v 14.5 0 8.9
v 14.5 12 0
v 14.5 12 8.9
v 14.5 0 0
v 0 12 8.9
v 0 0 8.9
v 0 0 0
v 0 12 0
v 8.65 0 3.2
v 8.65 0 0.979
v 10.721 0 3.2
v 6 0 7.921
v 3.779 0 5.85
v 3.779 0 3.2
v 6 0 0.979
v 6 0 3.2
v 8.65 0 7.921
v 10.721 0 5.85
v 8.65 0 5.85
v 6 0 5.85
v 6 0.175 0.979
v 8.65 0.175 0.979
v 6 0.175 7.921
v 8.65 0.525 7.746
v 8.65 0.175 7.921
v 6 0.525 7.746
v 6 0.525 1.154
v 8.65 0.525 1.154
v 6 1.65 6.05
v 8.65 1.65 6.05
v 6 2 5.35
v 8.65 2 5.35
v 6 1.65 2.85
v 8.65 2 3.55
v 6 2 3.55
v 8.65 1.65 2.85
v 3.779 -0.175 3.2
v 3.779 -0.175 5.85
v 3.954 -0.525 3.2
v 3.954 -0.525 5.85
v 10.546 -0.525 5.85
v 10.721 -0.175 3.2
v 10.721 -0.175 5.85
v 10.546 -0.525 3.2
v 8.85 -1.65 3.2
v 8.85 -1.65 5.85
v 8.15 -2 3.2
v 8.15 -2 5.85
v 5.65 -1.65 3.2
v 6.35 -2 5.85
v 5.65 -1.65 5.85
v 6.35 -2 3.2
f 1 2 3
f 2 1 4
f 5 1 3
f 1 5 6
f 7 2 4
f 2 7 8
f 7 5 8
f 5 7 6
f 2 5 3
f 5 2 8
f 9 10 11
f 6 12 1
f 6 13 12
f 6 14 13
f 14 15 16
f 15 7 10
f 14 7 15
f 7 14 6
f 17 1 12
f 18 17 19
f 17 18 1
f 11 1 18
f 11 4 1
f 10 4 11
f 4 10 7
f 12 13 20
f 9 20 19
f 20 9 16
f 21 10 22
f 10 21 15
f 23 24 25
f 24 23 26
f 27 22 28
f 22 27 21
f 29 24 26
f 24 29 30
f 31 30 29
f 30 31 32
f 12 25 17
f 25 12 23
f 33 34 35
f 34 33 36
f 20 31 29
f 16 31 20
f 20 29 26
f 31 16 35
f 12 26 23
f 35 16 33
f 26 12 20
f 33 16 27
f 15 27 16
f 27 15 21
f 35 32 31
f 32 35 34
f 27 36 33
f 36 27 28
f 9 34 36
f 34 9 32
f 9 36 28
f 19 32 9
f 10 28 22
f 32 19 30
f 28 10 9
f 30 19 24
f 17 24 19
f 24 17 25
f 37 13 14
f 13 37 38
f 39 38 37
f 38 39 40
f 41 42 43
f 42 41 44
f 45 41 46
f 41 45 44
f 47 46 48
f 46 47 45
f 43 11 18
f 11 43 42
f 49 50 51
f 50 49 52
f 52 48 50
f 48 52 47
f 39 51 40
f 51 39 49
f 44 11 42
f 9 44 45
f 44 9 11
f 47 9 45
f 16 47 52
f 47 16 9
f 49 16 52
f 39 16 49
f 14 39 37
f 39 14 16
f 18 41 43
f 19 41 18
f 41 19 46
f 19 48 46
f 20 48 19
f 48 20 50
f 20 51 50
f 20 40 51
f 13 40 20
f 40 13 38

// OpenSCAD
// file: Parts/ZipTiePoint.scad
module ziptiepoint(width = 2.5, depth = 2, cutout_sample = false) {
    module cutout(width, depth) {
        chamfer = 0.35;
        io_height = (depth) / tan(42);
        middle_height = depth * 1.25;

        // cutout for ziptie
        translate([0, - (2 * io_height + middle_height) / 2, - width / 2])
            linear_extrude(height = width + 0.15) {
                polygon([
                        [0, 0],
                        [chamfer-chamfer/2, 0],
                        [chamfer+chamfer/2, chamfer/2],
                        [depth - chamfer, io_height - chamfer],
                        [depth, io_height + chamfer],
                        [depth, io_height + middle_height - chamfer],
                        [depth - chamfer, io_height + middle_height + chamfer],
                        [chamfer+chamfer/2, 2 * io_height + middle_height - chamfer/2],
                        [chamfer-chamfer/2, 2 * io_height + middle_height],
                        [0, 2 * io_height + middle_height],
                    ]);
            }
    }

    if (cutout_sample) {
        cutout(width, depth);
    } else {
        rotate([90, 0, 180])
            cutout(width, depth);
    }
}

function ziptiepoint_fullHeight(ziptie_depth = 2) = (depth / tan(42))*2+(depth * 1.25);

ziptiepoint(cutout_sample = true);
// main file
use <Parts/ZipTiePoint.scad>

height = 8.9;
width = 14.5;
depth = 12;

union() {
    difference() {
        cube([width, depth, height]);
        translate([width / 2, 0, height / 2])
            rotate([90, 0, 90])
                ziptiepoint(cutout_sample = true);
    }
    translate([width / 2, 0, height / 2])
        rotate([90, 0, 90])
            ziptiepoint(cutout_sample = false);
}
